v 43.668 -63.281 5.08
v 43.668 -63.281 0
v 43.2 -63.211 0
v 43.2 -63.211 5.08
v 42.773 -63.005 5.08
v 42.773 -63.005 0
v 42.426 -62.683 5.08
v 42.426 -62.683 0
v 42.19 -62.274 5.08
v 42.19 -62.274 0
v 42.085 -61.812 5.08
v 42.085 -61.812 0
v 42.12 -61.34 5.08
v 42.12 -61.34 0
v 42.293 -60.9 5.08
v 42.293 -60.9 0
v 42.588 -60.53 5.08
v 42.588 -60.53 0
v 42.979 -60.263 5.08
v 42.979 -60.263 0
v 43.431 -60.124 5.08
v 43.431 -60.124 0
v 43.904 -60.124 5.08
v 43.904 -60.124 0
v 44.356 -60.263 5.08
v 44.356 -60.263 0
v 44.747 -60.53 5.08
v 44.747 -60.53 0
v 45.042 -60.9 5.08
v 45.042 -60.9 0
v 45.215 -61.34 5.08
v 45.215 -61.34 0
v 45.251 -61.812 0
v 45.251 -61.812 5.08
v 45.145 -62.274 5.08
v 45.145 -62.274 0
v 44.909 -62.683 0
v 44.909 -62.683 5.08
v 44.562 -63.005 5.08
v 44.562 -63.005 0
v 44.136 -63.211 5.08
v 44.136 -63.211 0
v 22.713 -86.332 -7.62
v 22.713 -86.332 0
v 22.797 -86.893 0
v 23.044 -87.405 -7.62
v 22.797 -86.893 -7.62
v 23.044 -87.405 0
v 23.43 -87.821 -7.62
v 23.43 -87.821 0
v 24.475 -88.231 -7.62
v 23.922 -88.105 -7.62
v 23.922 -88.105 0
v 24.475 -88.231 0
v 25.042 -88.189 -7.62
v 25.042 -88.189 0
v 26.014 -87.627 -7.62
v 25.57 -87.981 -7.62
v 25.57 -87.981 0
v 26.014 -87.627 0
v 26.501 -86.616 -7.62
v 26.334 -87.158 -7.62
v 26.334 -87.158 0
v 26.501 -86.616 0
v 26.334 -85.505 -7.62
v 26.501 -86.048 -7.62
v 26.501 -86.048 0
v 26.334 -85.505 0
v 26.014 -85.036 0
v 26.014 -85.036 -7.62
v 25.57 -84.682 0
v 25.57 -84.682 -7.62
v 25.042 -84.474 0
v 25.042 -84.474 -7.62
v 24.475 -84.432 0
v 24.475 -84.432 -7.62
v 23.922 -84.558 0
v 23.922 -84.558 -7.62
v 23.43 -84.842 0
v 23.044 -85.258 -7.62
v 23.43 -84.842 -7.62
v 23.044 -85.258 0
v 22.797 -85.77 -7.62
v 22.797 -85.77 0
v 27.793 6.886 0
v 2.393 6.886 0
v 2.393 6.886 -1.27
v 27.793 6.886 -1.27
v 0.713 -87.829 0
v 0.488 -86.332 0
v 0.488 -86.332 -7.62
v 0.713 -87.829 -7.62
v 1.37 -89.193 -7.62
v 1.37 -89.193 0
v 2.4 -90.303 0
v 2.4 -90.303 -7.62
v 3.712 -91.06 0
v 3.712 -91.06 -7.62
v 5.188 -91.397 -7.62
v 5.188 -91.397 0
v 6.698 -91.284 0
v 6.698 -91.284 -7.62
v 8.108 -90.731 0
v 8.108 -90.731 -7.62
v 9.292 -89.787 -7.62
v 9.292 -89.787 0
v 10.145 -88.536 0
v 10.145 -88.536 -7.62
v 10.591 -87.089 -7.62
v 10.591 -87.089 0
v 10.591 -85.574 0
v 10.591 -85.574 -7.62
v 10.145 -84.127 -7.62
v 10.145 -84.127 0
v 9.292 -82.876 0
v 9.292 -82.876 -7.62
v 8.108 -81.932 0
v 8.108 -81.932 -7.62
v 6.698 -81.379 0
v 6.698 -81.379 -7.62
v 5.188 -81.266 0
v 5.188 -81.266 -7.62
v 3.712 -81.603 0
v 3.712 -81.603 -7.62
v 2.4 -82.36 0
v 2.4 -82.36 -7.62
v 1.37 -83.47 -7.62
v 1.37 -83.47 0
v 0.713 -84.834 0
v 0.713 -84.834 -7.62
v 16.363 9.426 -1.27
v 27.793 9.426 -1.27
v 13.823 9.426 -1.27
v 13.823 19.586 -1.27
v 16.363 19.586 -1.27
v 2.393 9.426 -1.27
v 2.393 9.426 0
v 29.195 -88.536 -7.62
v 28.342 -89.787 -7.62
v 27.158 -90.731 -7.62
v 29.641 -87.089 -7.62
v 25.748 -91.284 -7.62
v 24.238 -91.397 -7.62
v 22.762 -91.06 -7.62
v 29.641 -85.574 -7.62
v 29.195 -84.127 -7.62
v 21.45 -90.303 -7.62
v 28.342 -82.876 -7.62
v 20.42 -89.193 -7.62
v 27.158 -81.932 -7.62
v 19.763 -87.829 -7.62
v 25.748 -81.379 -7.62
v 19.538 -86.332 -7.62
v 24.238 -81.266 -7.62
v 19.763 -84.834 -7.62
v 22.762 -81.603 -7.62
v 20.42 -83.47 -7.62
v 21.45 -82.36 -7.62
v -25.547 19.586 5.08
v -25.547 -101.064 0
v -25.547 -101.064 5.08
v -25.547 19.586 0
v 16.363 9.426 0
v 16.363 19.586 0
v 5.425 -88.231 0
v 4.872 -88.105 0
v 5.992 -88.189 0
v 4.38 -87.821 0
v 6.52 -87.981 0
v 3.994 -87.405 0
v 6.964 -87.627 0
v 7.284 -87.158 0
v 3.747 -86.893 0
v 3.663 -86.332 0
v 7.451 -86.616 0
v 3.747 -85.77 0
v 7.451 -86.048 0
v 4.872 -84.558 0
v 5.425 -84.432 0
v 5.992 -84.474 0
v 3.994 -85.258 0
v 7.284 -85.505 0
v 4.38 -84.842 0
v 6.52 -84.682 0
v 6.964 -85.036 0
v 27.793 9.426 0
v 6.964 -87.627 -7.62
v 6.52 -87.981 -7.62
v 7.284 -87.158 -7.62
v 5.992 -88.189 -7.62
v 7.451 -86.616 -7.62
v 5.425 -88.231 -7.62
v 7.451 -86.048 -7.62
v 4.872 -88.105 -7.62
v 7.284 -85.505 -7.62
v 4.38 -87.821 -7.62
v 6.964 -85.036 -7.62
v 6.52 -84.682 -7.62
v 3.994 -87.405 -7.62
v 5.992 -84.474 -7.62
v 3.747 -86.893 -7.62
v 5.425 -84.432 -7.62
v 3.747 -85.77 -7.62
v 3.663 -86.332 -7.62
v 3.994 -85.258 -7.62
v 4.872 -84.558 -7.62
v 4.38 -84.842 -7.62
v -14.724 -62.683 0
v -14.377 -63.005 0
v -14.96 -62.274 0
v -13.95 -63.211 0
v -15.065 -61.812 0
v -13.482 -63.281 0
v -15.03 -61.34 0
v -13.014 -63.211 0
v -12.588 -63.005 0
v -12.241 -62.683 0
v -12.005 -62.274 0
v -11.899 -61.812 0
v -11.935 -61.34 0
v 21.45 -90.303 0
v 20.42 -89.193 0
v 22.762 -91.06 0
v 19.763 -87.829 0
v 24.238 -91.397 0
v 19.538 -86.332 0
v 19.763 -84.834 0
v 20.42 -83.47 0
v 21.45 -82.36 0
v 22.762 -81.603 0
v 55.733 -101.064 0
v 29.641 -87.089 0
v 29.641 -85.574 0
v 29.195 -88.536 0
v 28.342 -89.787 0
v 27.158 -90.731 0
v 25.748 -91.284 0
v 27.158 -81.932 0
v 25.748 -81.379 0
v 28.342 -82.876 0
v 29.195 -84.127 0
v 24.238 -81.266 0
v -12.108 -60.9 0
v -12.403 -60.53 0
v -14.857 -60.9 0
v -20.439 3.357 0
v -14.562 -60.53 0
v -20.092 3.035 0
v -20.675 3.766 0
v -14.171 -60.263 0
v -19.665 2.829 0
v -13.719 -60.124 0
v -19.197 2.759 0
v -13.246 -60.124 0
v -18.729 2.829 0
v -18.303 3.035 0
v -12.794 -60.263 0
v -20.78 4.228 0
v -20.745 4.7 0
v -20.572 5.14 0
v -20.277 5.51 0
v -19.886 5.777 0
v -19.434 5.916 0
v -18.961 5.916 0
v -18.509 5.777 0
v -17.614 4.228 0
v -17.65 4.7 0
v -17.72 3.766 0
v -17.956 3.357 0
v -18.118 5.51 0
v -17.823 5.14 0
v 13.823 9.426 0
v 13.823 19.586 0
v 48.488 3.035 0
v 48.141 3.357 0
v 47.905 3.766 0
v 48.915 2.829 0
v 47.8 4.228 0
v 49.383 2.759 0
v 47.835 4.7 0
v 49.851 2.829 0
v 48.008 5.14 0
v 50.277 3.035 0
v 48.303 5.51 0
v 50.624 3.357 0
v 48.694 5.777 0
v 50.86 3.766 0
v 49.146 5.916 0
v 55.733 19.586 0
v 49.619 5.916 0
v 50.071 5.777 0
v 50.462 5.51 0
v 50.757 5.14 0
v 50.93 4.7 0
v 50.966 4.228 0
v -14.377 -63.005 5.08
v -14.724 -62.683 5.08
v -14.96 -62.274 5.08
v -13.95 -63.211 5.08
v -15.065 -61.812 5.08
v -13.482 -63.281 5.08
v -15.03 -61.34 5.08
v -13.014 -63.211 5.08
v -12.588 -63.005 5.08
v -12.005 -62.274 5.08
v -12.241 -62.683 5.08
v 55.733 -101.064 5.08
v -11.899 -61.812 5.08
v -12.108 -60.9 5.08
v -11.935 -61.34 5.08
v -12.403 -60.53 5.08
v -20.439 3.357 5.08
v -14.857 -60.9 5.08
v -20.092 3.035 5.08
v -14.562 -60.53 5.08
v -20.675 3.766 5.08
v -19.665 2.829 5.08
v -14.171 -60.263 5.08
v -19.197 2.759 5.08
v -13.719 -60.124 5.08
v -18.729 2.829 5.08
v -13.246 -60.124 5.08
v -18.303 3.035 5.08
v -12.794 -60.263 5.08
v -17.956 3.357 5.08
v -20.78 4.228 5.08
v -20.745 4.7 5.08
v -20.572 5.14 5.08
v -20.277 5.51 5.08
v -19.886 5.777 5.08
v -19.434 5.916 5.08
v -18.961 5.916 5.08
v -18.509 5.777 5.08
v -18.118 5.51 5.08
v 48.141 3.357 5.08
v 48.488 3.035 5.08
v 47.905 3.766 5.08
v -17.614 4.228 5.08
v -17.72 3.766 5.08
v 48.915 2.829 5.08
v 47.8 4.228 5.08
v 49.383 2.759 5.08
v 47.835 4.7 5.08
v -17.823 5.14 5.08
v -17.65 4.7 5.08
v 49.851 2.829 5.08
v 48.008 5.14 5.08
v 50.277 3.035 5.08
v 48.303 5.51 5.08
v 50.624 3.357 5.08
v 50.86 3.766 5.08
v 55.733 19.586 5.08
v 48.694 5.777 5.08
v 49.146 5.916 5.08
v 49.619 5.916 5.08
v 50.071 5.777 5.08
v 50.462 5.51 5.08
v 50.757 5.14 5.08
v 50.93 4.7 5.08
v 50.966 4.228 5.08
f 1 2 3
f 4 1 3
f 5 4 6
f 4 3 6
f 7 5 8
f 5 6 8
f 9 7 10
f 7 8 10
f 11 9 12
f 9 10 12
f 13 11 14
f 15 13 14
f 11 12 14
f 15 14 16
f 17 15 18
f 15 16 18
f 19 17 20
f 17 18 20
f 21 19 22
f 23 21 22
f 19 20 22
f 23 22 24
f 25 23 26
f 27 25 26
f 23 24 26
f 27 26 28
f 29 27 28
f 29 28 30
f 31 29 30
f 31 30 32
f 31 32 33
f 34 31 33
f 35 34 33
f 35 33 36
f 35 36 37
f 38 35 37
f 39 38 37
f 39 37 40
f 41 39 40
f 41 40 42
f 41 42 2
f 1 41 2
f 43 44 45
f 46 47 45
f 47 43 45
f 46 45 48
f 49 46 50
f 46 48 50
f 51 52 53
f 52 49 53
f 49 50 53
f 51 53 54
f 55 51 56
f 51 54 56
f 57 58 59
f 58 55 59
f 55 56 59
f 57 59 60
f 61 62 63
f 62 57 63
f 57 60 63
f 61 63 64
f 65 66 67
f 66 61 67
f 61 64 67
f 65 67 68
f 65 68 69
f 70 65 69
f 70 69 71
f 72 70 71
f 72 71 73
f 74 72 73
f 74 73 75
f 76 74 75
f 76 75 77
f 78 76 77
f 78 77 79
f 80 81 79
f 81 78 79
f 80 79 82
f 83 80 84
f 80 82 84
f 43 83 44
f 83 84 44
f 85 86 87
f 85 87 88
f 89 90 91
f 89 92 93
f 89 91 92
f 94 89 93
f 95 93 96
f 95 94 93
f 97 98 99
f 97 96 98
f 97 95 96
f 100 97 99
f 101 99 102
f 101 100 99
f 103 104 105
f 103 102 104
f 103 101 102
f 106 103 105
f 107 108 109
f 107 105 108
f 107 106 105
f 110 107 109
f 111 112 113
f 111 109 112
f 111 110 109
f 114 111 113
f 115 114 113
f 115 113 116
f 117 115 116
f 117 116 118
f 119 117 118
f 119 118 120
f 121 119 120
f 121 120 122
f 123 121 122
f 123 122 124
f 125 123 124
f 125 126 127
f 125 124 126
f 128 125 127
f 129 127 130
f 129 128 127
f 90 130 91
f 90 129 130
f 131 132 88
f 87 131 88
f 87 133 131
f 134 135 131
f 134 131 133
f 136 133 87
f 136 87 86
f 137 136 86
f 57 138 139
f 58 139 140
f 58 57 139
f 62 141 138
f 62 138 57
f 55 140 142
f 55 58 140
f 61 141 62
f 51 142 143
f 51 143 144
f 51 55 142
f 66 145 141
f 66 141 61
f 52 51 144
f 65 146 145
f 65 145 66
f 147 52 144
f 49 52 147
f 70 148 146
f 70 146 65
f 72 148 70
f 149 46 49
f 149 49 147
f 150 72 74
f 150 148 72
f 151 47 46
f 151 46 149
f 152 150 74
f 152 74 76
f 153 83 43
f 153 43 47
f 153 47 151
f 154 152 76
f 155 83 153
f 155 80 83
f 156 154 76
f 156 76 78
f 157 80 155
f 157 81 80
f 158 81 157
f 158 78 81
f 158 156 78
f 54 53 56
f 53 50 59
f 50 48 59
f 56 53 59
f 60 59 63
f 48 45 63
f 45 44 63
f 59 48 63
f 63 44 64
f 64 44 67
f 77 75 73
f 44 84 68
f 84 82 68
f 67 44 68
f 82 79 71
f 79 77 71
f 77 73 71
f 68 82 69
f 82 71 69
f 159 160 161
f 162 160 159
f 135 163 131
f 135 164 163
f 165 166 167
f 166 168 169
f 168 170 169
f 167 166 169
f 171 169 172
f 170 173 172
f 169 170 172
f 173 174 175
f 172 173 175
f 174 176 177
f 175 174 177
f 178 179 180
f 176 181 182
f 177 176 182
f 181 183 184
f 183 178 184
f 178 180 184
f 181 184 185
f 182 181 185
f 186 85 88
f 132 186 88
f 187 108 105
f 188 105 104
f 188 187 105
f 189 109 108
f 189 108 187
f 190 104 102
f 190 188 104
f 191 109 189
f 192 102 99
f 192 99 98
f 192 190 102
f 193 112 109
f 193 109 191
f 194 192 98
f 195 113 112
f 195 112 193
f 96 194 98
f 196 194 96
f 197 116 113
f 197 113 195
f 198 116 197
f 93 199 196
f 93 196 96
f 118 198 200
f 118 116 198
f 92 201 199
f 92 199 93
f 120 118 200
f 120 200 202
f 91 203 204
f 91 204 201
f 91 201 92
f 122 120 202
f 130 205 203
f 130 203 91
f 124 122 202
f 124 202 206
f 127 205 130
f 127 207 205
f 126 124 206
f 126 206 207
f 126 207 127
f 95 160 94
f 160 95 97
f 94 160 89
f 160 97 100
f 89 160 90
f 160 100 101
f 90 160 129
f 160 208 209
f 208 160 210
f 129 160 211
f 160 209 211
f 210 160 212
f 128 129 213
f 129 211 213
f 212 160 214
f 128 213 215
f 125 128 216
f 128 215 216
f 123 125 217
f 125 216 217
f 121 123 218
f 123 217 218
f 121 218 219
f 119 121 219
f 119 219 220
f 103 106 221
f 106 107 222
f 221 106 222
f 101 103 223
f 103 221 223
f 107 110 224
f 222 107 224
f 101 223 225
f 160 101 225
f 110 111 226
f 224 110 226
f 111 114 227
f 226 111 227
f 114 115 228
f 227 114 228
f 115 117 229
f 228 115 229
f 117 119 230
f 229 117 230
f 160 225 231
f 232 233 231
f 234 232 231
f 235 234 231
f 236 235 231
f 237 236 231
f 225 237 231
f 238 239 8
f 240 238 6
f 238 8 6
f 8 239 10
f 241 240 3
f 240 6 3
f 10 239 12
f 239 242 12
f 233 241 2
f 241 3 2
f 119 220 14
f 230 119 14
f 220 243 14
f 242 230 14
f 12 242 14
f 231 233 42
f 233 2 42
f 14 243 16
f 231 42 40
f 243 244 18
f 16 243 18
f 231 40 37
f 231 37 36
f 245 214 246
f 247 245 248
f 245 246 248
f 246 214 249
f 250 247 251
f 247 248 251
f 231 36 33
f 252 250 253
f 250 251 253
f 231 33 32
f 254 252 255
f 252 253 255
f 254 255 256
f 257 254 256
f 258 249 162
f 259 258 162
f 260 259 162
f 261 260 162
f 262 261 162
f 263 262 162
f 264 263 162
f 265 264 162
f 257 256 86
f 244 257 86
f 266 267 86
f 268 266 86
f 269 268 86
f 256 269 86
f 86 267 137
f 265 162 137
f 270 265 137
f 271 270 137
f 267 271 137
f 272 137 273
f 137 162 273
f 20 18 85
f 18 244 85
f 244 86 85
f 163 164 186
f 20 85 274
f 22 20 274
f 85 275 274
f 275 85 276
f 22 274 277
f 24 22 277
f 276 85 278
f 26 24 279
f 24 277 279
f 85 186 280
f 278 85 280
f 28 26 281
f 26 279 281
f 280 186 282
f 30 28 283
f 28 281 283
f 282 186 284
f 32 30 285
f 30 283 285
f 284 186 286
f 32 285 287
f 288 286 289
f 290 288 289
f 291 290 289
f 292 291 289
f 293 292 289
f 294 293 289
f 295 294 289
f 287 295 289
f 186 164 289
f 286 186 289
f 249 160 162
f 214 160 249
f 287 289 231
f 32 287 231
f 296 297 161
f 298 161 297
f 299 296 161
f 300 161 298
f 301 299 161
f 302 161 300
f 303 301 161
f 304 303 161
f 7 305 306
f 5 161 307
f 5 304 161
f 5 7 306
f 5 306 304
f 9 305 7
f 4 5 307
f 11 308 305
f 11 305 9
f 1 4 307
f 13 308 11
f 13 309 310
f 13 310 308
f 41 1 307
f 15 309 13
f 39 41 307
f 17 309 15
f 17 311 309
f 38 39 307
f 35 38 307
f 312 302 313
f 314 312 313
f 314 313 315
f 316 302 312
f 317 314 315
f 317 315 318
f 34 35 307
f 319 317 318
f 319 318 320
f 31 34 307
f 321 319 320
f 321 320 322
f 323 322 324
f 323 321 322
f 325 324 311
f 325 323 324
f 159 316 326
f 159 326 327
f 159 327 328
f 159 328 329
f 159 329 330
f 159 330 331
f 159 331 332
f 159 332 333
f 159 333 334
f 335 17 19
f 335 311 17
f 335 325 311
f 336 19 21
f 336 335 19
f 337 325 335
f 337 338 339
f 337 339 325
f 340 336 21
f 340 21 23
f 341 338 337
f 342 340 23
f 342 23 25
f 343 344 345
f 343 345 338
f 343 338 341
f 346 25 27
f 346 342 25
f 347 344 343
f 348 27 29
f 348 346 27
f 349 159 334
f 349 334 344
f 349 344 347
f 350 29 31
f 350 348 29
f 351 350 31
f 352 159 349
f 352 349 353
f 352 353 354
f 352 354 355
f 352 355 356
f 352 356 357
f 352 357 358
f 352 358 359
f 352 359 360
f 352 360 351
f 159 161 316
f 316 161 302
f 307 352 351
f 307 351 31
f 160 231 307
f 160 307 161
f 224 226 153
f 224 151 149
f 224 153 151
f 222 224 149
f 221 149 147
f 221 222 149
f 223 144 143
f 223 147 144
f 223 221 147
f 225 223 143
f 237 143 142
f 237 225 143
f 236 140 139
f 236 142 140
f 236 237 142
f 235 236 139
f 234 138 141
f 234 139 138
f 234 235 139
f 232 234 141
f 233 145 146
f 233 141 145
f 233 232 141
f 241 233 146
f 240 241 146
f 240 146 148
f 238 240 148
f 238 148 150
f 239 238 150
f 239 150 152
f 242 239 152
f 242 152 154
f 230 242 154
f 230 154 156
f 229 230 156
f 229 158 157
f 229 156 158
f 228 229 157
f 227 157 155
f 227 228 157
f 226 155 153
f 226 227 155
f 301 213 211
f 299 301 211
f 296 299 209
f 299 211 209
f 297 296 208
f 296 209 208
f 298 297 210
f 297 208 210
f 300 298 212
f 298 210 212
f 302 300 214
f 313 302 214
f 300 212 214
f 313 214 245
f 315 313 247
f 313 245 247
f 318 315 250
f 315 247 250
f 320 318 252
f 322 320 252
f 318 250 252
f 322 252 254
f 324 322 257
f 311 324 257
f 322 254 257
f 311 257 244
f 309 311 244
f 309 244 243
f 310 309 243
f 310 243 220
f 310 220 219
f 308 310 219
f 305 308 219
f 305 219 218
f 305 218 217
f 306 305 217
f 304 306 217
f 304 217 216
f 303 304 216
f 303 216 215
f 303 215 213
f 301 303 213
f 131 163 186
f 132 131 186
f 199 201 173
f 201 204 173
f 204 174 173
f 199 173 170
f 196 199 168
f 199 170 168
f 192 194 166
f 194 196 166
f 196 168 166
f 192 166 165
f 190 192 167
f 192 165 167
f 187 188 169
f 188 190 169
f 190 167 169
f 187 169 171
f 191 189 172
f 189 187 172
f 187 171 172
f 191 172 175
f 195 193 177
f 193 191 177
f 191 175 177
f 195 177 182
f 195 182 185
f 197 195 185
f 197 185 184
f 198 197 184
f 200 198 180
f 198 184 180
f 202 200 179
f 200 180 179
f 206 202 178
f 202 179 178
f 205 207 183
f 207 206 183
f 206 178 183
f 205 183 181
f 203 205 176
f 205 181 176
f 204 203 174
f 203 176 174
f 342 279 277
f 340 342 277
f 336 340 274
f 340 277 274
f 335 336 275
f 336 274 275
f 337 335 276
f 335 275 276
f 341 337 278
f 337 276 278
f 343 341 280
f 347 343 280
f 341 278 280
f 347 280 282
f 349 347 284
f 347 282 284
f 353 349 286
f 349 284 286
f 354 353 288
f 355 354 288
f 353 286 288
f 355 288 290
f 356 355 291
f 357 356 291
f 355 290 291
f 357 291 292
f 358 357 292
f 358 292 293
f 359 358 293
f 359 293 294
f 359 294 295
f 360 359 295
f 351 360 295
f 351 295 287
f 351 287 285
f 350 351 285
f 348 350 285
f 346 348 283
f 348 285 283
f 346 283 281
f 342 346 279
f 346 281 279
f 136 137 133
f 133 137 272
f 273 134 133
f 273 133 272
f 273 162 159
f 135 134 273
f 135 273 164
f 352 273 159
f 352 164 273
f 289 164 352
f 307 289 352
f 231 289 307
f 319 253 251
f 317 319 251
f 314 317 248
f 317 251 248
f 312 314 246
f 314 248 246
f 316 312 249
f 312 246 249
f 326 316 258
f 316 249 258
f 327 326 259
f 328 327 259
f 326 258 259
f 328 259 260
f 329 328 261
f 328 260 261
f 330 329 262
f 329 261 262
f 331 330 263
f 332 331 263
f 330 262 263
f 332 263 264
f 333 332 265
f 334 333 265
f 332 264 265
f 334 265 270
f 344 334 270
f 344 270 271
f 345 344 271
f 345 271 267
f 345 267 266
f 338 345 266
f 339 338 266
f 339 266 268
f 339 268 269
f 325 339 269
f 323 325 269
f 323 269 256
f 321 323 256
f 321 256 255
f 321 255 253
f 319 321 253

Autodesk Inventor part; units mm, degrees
ref_plane "YZ Plane" through (0, 0, 0) normal (1, 0, 0) x (0, 1, 0)
ref_plane "XZ Plane" through (0, 0, 0) normal (0, 1, 0) x (-1, 0, 0)
ref_plane "XY Plane" through (0, 0, 0) normal (0, 0, 1) x (1, 0, 0)
sketch "Sketch1" plane through (0, 0, 0) normal (0, 0, 1) x (1, 0, 0)
  line L0 (-25.5474, 19.5864) -> (55.7326, 19.5864)
  line L1 (55.7326, 19.5864) -> (55.7326, -101.0636)
  line L2 (55.7326, -101.0636) -> (-25.5474, -101.0636)
  line L3 (-25.5474, -101.0636) -> (-25.5474, 19.5864)
  dimension "d0" = 81.28
  dimension "d1" = 120.65
extrude "Extrusion1" add sketch "Sketch1" along normal blind 5.08
sketch "Sketch2" plane through (0, 0, 5.08) normal (0, 0, 1) x (1, 0, 0)
  line L0 (55.7326, 19.5864) -> (55.7326, -101.0636) projected
  line L1 (-25.5474, 19.5864) -> (55.7326, 19.5864) projected
  line L2 (-25.5474, -101.0636) -> (-25.5474, 19.5864) projected
  line L3 (55.7326, -101.0636) -> (-25.5474, -101.0636) projected
  line L4 (-19.1974, 4.3464) -> (49.3826, 4.3464)
  line L5 (49.3826, 4.3464) -> (43.6676, -61.6936)
  line L6 (43.6676, -61.6936) -> (-13.4824, -61.6936)
  line L7 (-13.4824, -61.6936) -> (-19.1974, 4.3464)
  circle A0 centre (15.0926, 4.3464) radius 40.64 construction
  circle A1 centre (15.0926, 4.3464) radius 34.29 construction
  circle A2 centre (15.0926, -61.6936) radius 28.575 construction
  dimension "d4" = 57.15
  dimension "d5" = 68.58
  dimension "d6" = 15.24
  dimension "d7" = 66.04
hole "Hole1" at (-19.1974, 4.3464, 5.08) at (49.3826, 4.3464, 5.08) at (43.6676, -61.6936, 5.08) at (-13.4824, -61.6936, 5.08) direction (0, 0, -1) diameter 3.175 end through all
sketch "Sketch3" plane through (-25.5474, 19.5864, 0) normal (0, 1, 0) x (1, 0, 0)
  line L0 (0, -5.08) -> (81.28, -5.08) projected
  line L1 (81.28, 0) -> (81.28, -5.08) projected
  line L2 (0, 0) -> (81.28, 0) projected
  line L3 (0, 0) -> (0, -5.08) projected
sketch "Sketch4" plane through (-25.5474, 19.5864, 0) normal (0, 1, 0) x (1, 0, 0)
  line L0 (81.28, 0) -> (81.28, -5.08) projected
  line L1 (0, 0) -> (81.28, 0) projected
  line L2 (0, 0) -> (0, -5.08) projected
  line L3 (39.37, 0) -> (41.91, 0)
  line L4 (41.91, 0) -> (41.91, 1.27)
  line L5 (41.91, 1.27) -> (39.37, 1.27)
  line L6 (39.37, 1.27) -> (39.37, 0)
  circle A0 centre (40.64, 0.4048) radius 1.27 construction
  circle A1 centre (40.64, 0.4048) radius 40.64 construction
  dimension "d15" = 2.54
  dimension "d16" = 1.27
extrude "Extrusion2" add sketch "Sketch4" against normal blind 12.7
sketch "Sketch5" plane through (-25.5474, 6.8864, 0) normal (0, -1, 0) x (1, 0, 0)
  line L0 (41.91, 0) -> (41.91, -1.27) projected
  line L1 (39.37, 0) -> (41.91, 0) projected
  line L2 (39.37, -1.27) -> (39.37, 0) projected
  line L3 (41.91, -1.27) -> (39.37, -1.27) projected
  line L4 (27.94, 0) -> (53.34, 0)
  line L5 (53.34, 0) -> (53.34, -1.27)
  line L6 (53.34, -1.27) -> (27.94, -1.27)
  line L7 (27.94, -1.27) -> (27.94, 0)
  circle A0 centre (40.64, -8.0178) radius 1.27 construction
  circle A1 centre (40.64, -8.0178) radius 12.7 construction
  dimension "d19" = 25.4
extrude "Extrusion3" add sketch "Sketch5" against normal blind 2.54
sketch "Sketch7" plane through (0, 0, 0) normal (0, 0, -1) x (-1, 0, 0)
  line L0 (-55.7326, 19.5864) -> (-55.7326, -101.0636) projected
  line L1 (25.5474, -101.0636) -> (25.5474, 19.5864) projected
  circle A0 centre (13.4824, -61.6936) radius 1.5875 projected
  circle A1 centre (-5.5676, -86.3316) radius 5.08
  circle A2 centre (-5.5676, -86.3316) radius 1.905
  circle A3 centre (-24.6176, -86.3316) radius 5.08
  circle A4 centre (-24.6176, -86.3316) radius 1.905
  circle A5 centre (-15.0926, -74.2033) radius 15.4215 construction
  circle A6 centre (-15.0926, -74.2033) radius 40.64 construction
  dimension "d26" = 19.05
  dimension "d27" = 24.638
  dimension "d28" = 3.81
  dimension "d29" = 10.16
extrude "Extrusion5" add sketch "Sketch7" along normal blind 7.62 contours A1 | A3
properties part number "baseplate"
